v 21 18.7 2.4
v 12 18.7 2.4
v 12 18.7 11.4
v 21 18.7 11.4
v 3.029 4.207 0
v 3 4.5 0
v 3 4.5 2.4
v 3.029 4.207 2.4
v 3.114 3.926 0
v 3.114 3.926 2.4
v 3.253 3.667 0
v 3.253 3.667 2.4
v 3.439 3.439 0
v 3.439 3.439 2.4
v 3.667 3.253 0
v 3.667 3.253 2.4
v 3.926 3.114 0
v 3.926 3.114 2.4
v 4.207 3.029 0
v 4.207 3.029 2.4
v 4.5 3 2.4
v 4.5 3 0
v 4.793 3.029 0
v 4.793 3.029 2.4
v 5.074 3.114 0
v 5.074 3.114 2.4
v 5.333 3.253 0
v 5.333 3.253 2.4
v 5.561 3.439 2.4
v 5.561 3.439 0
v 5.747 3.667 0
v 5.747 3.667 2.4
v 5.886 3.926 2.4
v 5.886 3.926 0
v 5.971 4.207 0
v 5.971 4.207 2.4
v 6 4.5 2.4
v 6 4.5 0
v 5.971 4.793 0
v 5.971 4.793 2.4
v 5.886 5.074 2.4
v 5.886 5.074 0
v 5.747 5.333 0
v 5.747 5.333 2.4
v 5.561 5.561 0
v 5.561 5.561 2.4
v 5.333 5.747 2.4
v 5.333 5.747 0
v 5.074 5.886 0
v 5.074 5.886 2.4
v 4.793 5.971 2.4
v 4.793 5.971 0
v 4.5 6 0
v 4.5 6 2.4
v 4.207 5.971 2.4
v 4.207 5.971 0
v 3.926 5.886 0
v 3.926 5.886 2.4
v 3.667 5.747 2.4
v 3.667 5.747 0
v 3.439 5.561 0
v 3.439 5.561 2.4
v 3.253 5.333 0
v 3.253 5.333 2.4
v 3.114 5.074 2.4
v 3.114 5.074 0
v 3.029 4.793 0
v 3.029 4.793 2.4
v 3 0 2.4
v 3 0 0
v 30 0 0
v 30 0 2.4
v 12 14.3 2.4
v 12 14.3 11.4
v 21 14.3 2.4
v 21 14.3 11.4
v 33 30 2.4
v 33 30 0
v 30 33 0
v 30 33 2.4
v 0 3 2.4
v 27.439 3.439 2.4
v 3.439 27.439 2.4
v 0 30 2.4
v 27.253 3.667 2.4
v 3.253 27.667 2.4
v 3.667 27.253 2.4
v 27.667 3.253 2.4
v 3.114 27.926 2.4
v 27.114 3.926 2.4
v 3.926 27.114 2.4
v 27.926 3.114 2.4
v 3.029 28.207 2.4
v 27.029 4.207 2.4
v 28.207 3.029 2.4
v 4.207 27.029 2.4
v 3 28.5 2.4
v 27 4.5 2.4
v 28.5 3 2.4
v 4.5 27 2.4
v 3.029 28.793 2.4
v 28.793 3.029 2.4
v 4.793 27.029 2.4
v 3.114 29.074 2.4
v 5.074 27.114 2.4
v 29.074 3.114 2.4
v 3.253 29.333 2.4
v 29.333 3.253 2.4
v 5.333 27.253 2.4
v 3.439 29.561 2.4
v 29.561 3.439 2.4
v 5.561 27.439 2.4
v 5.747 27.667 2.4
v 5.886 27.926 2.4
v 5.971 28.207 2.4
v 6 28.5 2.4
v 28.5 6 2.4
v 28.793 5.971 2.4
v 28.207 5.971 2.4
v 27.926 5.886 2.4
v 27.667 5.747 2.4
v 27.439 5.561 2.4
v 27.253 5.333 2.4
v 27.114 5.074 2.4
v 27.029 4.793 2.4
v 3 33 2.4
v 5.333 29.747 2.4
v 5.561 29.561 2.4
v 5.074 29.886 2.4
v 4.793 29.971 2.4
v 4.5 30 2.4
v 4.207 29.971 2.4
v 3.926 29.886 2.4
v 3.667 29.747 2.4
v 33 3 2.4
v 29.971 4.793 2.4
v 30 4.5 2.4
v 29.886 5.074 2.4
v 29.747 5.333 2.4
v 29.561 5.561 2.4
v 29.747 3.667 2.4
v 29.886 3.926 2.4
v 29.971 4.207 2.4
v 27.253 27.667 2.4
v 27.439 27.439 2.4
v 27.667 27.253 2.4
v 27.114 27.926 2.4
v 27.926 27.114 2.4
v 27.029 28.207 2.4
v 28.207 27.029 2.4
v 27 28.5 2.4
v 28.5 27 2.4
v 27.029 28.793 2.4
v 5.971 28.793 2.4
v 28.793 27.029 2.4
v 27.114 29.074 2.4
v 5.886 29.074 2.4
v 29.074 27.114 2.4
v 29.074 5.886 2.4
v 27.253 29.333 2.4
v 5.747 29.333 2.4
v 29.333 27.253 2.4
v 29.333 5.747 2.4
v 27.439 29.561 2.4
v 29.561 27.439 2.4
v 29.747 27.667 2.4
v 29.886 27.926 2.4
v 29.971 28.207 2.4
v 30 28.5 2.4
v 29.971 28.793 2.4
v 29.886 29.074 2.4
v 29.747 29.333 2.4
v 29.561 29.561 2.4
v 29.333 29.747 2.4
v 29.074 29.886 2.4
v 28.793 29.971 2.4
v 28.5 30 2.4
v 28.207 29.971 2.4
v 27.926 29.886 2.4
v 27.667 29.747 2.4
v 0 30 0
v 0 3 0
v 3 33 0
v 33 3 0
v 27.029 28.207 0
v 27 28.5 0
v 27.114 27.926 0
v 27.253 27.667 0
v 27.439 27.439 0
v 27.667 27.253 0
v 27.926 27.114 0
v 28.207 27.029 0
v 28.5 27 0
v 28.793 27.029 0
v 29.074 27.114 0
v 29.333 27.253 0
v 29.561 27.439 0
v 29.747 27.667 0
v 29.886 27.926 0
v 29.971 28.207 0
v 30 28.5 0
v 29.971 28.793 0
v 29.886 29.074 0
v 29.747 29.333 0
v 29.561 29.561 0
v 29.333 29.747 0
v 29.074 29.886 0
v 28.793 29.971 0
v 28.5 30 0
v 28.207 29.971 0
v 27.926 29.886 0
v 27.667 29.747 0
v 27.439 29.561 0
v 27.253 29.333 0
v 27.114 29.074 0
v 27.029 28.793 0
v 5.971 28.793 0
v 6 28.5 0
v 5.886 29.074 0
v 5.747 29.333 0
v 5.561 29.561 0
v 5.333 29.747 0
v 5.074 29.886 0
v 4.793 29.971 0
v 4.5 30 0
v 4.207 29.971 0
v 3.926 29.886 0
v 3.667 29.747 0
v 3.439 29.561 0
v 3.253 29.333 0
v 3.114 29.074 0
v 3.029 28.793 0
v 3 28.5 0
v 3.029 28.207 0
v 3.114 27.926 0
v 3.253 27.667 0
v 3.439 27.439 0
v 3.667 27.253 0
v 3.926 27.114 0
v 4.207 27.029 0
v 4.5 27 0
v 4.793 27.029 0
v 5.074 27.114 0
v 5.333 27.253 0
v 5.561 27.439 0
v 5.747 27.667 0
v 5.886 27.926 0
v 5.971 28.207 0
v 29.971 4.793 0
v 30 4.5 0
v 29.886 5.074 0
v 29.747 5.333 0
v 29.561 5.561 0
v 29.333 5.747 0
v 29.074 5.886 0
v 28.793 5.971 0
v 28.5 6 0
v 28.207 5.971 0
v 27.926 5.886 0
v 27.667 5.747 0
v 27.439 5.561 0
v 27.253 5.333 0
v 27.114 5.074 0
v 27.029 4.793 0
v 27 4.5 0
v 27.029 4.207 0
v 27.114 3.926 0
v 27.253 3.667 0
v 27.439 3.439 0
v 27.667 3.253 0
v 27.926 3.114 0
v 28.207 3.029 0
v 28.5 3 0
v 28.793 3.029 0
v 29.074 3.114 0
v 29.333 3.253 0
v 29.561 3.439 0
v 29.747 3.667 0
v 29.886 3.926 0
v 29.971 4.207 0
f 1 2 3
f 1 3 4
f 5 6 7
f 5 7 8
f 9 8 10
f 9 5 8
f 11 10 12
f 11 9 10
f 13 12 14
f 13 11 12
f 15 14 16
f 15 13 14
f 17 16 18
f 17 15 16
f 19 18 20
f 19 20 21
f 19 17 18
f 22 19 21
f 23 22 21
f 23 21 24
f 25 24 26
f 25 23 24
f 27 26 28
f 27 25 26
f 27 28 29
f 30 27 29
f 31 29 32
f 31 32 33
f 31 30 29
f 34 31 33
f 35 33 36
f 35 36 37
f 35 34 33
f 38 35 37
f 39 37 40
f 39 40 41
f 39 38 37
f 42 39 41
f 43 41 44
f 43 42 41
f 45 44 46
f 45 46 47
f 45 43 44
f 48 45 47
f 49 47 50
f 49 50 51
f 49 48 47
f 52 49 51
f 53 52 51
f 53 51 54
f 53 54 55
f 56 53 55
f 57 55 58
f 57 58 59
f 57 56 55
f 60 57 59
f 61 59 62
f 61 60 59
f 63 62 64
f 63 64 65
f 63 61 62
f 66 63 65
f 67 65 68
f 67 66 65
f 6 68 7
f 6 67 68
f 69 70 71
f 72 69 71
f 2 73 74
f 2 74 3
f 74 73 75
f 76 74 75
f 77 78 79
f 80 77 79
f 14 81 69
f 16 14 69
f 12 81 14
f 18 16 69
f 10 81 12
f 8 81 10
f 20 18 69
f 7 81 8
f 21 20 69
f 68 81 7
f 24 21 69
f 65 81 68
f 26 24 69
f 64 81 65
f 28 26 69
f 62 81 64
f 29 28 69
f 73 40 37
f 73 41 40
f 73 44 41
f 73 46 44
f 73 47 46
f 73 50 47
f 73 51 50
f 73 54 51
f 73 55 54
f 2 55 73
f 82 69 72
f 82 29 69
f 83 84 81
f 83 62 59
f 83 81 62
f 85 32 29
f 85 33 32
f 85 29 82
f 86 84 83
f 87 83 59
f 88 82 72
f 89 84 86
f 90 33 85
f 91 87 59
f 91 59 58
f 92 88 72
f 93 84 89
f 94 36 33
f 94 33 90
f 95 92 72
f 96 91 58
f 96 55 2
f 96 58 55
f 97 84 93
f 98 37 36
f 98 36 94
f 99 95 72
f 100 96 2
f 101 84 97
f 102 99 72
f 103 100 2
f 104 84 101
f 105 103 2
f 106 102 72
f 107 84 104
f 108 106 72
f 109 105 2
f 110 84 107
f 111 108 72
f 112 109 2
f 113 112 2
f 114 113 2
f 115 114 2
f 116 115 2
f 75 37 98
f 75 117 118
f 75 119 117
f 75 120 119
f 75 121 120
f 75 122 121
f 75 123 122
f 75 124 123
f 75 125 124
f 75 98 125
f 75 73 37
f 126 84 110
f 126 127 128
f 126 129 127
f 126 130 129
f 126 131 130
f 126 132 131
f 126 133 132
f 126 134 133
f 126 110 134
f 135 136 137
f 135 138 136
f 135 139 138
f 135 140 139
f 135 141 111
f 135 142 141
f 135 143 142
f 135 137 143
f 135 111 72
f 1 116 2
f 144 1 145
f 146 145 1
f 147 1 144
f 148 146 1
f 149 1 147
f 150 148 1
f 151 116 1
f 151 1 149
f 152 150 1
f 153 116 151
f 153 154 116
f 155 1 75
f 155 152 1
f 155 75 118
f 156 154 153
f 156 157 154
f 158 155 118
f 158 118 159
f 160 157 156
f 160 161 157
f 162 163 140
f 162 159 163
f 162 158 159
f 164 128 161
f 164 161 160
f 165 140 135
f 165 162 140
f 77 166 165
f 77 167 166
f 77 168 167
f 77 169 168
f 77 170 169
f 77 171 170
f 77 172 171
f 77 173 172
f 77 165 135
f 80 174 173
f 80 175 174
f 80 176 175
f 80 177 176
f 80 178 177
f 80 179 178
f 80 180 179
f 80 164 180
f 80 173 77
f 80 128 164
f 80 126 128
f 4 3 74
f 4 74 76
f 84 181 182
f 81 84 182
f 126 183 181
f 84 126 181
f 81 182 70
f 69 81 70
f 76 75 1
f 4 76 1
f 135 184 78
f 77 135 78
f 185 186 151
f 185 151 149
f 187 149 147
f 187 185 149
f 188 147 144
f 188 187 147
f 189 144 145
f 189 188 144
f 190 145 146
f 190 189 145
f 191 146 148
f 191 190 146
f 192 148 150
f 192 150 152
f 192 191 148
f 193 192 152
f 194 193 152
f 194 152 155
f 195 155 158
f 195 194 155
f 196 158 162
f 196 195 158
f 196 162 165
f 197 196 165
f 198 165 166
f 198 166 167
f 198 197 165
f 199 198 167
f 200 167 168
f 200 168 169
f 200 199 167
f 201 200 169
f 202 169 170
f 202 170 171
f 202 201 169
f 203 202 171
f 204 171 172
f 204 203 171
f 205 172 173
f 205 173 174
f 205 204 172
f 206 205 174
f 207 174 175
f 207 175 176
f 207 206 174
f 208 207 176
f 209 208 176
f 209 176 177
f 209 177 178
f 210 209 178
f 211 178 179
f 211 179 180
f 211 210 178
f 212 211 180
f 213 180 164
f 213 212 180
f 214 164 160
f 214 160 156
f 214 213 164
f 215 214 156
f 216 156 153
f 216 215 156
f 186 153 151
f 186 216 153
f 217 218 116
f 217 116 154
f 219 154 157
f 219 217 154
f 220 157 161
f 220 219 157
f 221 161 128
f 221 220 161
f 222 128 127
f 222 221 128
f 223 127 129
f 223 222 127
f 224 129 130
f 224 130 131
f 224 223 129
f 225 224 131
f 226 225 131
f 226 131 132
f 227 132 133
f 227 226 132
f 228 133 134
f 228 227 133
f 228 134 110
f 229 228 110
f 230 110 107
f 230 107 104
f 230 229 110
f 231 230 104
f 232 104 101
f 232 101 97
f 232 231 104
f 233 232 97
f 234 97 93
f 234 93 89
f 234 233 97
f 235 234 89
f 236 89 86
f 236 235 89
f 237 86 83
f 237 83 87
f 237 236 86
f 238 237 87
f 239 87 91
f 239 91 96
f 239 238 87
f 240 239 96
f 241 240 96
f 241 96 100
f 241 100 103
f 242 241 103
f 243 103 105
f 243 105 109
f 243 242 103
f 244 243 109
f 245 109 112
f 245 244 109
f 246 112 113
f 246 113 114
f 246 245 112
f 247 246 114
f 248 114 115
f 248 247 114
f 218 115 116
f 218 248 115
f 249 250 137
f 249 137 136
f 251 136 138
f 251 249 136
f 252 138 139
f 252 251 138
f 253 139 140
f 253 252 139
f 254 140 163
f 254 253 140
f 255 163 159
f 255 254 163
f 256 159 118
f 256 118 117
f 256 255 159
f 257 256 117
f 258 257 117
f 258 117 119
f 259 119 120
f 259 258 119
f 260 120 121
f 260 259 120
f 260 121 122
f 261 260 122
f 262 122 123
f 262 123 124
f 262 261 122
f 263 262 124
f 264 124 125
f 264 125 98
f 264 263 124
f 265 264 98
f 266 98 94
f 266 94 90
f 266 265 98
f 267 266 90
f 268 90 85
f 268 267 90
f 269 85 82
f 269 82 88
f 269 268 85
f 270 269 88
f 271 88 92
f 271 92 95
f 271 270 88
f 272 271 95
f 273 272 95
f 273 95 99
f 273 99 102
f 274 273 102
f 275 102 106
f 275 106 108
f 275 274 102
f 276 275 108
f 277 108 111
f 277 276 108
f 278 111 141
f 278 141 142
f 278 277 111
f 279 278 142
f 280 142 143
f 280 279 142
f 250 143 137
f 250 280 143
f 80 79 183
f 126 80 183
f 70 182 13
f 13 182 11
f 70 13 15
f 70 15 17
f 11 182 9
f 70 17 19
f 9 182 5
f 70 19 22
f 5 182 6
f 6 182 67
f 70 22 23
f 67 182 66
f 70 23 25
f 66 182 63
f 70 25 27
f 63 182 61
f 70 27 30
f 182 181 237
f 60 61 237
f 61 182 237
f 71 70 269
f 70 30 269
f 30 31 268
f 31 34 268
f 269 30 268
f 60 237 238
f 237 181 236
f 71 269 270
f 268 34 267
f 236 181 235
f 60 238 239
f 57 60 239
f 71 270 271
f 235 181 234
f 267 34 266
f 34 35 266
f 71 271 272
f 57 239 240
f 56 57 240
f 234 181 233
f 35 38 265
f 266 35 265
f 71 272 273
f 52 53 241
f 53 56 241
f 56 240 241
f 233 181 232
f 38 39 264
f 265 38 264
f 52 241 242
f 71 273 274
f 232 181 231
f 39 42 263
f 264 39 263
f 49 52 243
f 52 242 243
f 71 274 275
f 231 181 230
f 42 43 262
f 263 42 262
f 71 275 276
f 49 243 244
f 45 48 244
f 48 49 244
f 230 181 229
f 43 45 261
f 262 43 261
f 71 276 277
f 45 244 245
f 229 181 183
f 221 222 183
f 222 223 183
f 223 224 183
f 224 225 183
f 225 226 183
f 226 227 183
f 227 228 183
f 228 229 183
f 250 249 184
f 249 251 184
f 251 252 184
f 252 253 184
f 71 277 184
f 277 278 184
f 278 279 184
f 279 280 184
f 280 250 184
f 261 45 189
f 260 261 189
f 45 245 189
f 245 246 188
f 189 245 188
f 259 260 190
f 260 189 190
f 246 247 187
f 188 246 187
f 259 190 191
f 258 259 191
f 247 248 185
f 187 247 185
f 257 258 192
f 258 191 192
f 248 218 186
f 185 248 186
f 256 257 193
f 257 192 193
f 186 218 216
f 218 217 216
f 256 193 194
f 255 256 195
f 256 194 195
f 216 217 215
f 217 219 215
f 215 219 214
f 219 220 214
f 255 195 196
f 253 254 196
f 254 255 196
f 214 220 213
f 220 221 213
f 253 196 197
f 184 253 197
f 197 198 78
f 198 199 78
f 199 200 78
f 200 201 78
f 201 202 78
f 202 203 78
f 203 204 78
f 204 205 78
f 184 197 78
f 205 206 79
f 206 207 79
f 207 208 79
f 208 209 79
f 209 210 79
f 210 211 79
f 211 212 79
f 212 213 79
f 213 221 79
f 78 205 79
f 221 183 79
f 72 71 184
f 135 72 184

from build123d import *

# Parameters (mm, degrees)
ESQUISSE1_R        = 1.5
BOSS_EXTRU_1_DEPTH = 2.4
ESQUISSE2_W        = 9
ESQUISSE2_H        = 4.4
BOSS_EXTRU_2_DEPTH = 9


with BuildPart() as part:
    # Esquisse1 → Boss.-Extru.1 (new body)
    with BuildSketch(Plane.XY):
        Polygon((0, 30), (0, 3), (3, 0), (30, 0), (33, 3), (33, 30), (30, 33), (3, 33), align=None)
        with Locations((4.5, 28.5)):
            Circle(ESQUISSE1_R, mode=Mode.SUBTRACT)
        with Locations(Location((28.5, 28.5, 0), (0, 0, 180))):
            Circle(ESQUISSE1_R, mode=Mode.SUBTRACT)
        with Locations(Location((4.5, 4.5, 0), (0, 0, 180))):
            Circle(ESQUISSE1_R, mode=Mode.SUBTRACT)
        with Locations((28.5, 4.5)):
            Circle(ESQUISSE1_R, mode=Mode.SUBTRACT)
    extrude(amount=BOSS_EXTRU_1_DEPTH)

    # Esquisse2 → Boss.-Extru.2 (add)
    with BuildSketch(Plane.XY.offset(2.4)):
        with Locations((16.5, 16.5)):
            Rectangle(ESQUISSE2_W, ESQUISSE2_H)
    extrude(amount=BOSS_EXTRU_2_DEPTH)


solid = part.part
